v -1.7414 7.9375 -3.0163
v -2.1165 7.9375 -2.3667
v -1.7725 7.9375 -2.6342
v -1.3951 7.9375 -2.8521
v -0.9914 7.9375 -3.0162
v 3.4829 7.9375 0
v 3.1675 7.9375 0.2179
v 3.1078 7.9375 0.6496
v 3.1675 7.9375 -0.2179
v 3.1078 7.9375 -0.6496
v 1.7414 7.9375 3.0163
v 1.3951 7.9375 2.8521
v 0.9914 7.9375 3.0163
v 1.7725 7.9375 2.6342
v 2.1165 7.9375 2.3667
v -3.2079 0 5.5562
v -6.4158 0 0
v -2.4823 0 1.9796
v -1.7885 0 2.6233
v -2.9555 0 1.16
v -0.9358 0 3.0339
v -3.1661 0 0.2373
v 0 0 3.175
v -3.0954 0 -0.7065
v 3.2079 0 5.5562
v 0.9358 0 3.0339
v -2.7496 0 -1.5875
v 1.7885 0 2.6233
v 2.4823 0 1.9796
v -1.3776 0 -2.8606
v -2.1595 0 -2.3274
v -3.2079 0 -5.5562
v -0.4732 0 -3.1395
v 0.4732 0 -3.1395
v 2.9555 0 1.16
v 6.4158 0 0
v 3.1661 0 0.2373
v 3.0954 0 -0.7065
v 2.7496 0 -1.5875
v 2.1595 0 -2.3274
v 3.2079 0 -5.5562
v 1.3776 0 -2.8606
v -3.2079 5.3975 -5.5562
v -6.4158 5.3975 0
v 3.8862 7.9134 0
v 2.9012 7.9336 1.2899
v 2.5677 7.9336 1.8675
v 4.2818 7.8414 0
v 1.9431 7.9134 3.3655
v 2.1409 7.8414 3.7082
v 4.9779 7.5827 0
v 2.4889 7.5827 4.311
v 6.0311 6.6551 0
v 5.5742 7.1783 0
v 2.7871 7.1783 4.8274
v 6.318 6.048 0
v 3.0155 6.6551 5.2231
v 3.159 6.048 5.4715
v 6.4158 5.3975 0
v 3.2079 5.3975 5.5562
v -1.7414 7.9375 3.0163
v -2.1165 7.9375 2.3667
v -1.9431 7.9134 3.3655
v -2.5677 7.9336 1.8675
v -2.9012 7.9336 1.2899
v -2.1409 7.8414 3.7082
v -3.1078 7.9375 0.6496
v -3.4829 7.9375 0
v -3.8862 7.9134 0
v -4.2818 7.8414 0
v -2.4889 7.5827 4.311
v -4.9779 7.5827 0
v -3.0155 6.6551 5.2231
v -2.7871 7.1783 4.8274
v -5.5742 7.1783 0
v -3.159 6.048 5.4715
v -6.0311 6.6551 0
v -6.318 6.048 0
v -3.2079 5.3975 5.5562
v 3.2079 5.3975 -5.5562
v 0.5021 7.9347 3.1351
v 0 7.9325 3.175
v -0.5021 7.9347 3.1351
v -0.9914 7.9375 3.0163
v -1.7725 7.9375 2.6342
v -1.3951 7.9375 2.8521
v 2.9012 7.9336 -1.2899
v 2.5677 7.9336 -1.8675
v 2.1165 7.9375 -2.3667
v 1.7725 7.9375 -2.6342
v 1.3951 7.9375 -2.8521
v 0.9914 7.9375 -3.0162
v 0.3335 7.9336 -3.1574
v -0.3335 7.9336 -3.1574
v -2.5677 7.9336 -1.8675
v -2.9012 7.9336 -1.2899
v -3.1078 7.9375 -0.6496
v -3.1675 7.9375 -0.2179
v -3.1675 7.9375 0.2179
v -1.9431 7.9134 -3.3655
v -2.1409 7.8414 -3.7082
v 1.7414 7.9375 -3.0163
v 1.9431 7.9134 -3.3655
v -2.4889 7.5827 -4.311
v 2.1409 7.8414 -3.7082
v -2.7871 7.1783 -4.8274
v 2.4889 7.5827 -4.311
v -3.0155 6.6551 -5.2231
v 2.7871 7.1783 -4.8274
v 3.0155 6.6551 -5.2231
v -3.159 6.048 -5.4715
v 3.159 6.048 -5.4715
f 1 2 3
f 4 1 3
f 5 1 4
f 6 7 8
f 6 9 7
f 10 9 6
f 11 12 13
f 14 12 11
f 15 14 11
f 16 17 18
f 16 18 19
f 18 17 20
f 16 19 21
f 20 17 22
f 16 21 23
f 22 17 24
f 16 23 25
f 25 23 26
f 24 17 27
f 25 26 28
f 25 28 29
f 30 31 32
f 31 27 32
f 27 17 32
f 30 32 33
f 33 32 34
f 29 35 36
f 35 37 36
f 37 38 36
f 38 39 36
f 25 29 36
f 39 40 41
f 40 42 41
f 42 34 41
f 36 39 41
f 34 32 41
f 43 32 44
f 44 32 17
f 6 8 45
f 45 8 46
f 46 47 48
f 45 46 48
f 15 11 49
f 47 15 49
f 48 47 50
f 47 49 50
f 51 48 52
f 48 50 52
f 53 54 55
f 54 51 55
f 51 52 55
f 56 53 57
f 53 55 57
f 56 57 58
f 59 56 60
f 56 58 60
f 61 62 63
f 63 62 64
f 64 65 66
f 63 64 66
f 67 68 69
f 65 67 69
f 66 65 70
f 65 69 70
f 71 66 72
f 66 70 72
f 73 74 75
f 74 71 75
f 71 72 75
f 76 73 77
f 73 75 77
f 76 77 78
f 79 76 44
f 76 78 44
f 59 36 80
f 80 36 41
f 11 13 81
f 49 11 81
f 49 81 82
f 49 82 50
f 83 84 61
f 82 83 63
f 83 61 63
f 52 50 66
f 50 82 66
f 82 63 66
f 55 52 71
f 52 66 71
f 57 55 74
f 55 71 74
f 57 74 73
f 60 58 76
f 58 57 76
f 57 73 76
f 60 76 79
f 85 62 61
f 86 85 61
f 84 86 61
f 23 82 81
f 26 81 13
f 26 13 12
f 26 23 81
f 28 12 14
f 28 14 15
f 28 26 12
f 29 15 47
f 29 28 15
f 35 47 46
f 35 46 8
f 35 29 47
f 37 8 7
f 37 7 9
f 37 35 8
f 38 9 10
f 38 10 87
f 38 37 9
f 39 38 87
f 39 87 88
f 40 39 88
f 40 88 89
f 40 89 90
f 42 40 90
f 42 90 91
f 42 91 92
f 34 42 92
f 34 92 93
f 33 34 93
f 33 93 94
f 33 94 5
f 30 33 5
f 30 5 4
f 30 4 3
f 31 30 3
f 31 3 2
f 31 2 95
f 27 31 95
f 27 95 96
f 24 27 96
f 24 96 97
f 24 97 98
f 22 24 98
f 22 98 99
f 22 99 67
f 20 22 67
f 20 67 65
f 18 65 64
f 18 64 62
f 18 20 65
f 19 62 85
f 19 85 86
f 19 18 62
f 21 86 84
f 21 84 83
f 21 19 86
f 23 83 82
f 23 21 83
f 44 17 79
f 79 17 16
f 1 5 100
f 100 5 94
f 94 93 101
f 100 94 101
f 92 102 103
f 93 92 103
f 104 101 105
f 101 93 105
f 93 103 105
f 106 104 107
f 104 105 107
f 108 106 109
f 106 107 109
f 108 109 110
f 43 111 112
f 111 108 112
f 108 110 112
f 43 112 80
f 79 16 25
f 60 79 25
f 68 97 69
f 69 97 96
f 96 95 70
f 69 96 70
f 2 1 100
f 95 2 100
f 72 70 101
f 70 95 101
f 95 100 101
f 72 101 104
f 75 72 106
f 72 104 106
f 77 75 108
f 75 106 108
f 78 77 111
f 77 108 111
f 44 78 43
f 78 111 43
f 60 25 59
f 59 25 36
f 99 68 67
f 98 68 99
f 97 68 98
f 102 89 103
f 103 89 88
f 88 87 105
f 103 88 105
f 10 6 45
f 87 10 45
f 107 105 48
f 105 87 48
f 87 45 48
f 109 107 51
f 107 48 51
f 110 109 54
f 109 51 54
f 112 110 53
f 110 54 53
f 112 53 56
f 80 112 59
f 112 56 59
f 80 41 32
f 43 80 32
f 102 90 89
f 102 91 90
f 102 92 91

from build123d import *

# Parameters (mm, degrees)
SKETCH1_R           = 3.175
BOSS_EXTRUDE1_DEPTH = 7.9375
FILLET1_R           = 2.54


with BuildPart() as part:
    # Sketch1 → Boss-Extrude1 (new body)
    with BuildSketch(Plane(origin=(0, 0, 0), x_dir=(1, 0, 0), z_dir=(0, 1, 0))):
        Polygon((-6.415804866, 0), (-3.207902433, -5.55625), (3.207902433, -5.55625), (6.415804866, 0), (3.207902433, 5.55625), (-3.207902433, 5.55625), align=None)
        with Locations(Location((0, 0, 0), (0, 0, 270))):
            Circle(SKETCH1_R, mode=Mode.SUBTRACT)
    extrude(amount=BOSS_EXTRUDE1_DEPTH)

    # Fillet1
    # the kernel refuses this fillet: 2.54 mm, written as the material it takes off along each edge
    with BuildSketch(Plane(origin=(-9.557902433, 7.9375, 5.55625), x_dir=(0, -1, 0), z_dir=(1, 0, 0)), Plane(origin=(0.032902433, 7.9375, 11.055511314), x_dir=(0, -1, 0), z_dir=(0.49999999999999967, 0, -0.8660254037844389)), Plane(origin=(9.590804866, 7.9375, 5.499261314), x_dir=(0, -1, 0), z_dir=(-0.5000000000000002, 0, -0.8660254037844386)), Plane(origin=(9.557902433, 7.9375, -5.55625), x_dir=(0, -1, 0), z_dir=(-1, 0, 0)), Plane(origin=(-0.032902433, 7.9375, -11.055511314), x_dir=(0, -1, 0), z_dir=(-0.49999999999999983, 0, 0.8660254037844388)), Plane(origin=(-9.590804866, 7.9375, -5.499261314), x_dir=(0, -1, 0), z_dir=(0.5000000000000001, 0, 0.8660254037844386))) as fillet1_piece_1:
        with BuildLine():
            CenterArc((FILLET1_R, FILLET1_R), FILLET1_R, 180, 90)
            Line((0, FILLET1_R), (0, 0))
            Line((0, 0), (FILLET1_R, 0))
        make_face()
    extrude(amount=19.115804866, mode=Mode.SUBTRACT)


solid = part.part
